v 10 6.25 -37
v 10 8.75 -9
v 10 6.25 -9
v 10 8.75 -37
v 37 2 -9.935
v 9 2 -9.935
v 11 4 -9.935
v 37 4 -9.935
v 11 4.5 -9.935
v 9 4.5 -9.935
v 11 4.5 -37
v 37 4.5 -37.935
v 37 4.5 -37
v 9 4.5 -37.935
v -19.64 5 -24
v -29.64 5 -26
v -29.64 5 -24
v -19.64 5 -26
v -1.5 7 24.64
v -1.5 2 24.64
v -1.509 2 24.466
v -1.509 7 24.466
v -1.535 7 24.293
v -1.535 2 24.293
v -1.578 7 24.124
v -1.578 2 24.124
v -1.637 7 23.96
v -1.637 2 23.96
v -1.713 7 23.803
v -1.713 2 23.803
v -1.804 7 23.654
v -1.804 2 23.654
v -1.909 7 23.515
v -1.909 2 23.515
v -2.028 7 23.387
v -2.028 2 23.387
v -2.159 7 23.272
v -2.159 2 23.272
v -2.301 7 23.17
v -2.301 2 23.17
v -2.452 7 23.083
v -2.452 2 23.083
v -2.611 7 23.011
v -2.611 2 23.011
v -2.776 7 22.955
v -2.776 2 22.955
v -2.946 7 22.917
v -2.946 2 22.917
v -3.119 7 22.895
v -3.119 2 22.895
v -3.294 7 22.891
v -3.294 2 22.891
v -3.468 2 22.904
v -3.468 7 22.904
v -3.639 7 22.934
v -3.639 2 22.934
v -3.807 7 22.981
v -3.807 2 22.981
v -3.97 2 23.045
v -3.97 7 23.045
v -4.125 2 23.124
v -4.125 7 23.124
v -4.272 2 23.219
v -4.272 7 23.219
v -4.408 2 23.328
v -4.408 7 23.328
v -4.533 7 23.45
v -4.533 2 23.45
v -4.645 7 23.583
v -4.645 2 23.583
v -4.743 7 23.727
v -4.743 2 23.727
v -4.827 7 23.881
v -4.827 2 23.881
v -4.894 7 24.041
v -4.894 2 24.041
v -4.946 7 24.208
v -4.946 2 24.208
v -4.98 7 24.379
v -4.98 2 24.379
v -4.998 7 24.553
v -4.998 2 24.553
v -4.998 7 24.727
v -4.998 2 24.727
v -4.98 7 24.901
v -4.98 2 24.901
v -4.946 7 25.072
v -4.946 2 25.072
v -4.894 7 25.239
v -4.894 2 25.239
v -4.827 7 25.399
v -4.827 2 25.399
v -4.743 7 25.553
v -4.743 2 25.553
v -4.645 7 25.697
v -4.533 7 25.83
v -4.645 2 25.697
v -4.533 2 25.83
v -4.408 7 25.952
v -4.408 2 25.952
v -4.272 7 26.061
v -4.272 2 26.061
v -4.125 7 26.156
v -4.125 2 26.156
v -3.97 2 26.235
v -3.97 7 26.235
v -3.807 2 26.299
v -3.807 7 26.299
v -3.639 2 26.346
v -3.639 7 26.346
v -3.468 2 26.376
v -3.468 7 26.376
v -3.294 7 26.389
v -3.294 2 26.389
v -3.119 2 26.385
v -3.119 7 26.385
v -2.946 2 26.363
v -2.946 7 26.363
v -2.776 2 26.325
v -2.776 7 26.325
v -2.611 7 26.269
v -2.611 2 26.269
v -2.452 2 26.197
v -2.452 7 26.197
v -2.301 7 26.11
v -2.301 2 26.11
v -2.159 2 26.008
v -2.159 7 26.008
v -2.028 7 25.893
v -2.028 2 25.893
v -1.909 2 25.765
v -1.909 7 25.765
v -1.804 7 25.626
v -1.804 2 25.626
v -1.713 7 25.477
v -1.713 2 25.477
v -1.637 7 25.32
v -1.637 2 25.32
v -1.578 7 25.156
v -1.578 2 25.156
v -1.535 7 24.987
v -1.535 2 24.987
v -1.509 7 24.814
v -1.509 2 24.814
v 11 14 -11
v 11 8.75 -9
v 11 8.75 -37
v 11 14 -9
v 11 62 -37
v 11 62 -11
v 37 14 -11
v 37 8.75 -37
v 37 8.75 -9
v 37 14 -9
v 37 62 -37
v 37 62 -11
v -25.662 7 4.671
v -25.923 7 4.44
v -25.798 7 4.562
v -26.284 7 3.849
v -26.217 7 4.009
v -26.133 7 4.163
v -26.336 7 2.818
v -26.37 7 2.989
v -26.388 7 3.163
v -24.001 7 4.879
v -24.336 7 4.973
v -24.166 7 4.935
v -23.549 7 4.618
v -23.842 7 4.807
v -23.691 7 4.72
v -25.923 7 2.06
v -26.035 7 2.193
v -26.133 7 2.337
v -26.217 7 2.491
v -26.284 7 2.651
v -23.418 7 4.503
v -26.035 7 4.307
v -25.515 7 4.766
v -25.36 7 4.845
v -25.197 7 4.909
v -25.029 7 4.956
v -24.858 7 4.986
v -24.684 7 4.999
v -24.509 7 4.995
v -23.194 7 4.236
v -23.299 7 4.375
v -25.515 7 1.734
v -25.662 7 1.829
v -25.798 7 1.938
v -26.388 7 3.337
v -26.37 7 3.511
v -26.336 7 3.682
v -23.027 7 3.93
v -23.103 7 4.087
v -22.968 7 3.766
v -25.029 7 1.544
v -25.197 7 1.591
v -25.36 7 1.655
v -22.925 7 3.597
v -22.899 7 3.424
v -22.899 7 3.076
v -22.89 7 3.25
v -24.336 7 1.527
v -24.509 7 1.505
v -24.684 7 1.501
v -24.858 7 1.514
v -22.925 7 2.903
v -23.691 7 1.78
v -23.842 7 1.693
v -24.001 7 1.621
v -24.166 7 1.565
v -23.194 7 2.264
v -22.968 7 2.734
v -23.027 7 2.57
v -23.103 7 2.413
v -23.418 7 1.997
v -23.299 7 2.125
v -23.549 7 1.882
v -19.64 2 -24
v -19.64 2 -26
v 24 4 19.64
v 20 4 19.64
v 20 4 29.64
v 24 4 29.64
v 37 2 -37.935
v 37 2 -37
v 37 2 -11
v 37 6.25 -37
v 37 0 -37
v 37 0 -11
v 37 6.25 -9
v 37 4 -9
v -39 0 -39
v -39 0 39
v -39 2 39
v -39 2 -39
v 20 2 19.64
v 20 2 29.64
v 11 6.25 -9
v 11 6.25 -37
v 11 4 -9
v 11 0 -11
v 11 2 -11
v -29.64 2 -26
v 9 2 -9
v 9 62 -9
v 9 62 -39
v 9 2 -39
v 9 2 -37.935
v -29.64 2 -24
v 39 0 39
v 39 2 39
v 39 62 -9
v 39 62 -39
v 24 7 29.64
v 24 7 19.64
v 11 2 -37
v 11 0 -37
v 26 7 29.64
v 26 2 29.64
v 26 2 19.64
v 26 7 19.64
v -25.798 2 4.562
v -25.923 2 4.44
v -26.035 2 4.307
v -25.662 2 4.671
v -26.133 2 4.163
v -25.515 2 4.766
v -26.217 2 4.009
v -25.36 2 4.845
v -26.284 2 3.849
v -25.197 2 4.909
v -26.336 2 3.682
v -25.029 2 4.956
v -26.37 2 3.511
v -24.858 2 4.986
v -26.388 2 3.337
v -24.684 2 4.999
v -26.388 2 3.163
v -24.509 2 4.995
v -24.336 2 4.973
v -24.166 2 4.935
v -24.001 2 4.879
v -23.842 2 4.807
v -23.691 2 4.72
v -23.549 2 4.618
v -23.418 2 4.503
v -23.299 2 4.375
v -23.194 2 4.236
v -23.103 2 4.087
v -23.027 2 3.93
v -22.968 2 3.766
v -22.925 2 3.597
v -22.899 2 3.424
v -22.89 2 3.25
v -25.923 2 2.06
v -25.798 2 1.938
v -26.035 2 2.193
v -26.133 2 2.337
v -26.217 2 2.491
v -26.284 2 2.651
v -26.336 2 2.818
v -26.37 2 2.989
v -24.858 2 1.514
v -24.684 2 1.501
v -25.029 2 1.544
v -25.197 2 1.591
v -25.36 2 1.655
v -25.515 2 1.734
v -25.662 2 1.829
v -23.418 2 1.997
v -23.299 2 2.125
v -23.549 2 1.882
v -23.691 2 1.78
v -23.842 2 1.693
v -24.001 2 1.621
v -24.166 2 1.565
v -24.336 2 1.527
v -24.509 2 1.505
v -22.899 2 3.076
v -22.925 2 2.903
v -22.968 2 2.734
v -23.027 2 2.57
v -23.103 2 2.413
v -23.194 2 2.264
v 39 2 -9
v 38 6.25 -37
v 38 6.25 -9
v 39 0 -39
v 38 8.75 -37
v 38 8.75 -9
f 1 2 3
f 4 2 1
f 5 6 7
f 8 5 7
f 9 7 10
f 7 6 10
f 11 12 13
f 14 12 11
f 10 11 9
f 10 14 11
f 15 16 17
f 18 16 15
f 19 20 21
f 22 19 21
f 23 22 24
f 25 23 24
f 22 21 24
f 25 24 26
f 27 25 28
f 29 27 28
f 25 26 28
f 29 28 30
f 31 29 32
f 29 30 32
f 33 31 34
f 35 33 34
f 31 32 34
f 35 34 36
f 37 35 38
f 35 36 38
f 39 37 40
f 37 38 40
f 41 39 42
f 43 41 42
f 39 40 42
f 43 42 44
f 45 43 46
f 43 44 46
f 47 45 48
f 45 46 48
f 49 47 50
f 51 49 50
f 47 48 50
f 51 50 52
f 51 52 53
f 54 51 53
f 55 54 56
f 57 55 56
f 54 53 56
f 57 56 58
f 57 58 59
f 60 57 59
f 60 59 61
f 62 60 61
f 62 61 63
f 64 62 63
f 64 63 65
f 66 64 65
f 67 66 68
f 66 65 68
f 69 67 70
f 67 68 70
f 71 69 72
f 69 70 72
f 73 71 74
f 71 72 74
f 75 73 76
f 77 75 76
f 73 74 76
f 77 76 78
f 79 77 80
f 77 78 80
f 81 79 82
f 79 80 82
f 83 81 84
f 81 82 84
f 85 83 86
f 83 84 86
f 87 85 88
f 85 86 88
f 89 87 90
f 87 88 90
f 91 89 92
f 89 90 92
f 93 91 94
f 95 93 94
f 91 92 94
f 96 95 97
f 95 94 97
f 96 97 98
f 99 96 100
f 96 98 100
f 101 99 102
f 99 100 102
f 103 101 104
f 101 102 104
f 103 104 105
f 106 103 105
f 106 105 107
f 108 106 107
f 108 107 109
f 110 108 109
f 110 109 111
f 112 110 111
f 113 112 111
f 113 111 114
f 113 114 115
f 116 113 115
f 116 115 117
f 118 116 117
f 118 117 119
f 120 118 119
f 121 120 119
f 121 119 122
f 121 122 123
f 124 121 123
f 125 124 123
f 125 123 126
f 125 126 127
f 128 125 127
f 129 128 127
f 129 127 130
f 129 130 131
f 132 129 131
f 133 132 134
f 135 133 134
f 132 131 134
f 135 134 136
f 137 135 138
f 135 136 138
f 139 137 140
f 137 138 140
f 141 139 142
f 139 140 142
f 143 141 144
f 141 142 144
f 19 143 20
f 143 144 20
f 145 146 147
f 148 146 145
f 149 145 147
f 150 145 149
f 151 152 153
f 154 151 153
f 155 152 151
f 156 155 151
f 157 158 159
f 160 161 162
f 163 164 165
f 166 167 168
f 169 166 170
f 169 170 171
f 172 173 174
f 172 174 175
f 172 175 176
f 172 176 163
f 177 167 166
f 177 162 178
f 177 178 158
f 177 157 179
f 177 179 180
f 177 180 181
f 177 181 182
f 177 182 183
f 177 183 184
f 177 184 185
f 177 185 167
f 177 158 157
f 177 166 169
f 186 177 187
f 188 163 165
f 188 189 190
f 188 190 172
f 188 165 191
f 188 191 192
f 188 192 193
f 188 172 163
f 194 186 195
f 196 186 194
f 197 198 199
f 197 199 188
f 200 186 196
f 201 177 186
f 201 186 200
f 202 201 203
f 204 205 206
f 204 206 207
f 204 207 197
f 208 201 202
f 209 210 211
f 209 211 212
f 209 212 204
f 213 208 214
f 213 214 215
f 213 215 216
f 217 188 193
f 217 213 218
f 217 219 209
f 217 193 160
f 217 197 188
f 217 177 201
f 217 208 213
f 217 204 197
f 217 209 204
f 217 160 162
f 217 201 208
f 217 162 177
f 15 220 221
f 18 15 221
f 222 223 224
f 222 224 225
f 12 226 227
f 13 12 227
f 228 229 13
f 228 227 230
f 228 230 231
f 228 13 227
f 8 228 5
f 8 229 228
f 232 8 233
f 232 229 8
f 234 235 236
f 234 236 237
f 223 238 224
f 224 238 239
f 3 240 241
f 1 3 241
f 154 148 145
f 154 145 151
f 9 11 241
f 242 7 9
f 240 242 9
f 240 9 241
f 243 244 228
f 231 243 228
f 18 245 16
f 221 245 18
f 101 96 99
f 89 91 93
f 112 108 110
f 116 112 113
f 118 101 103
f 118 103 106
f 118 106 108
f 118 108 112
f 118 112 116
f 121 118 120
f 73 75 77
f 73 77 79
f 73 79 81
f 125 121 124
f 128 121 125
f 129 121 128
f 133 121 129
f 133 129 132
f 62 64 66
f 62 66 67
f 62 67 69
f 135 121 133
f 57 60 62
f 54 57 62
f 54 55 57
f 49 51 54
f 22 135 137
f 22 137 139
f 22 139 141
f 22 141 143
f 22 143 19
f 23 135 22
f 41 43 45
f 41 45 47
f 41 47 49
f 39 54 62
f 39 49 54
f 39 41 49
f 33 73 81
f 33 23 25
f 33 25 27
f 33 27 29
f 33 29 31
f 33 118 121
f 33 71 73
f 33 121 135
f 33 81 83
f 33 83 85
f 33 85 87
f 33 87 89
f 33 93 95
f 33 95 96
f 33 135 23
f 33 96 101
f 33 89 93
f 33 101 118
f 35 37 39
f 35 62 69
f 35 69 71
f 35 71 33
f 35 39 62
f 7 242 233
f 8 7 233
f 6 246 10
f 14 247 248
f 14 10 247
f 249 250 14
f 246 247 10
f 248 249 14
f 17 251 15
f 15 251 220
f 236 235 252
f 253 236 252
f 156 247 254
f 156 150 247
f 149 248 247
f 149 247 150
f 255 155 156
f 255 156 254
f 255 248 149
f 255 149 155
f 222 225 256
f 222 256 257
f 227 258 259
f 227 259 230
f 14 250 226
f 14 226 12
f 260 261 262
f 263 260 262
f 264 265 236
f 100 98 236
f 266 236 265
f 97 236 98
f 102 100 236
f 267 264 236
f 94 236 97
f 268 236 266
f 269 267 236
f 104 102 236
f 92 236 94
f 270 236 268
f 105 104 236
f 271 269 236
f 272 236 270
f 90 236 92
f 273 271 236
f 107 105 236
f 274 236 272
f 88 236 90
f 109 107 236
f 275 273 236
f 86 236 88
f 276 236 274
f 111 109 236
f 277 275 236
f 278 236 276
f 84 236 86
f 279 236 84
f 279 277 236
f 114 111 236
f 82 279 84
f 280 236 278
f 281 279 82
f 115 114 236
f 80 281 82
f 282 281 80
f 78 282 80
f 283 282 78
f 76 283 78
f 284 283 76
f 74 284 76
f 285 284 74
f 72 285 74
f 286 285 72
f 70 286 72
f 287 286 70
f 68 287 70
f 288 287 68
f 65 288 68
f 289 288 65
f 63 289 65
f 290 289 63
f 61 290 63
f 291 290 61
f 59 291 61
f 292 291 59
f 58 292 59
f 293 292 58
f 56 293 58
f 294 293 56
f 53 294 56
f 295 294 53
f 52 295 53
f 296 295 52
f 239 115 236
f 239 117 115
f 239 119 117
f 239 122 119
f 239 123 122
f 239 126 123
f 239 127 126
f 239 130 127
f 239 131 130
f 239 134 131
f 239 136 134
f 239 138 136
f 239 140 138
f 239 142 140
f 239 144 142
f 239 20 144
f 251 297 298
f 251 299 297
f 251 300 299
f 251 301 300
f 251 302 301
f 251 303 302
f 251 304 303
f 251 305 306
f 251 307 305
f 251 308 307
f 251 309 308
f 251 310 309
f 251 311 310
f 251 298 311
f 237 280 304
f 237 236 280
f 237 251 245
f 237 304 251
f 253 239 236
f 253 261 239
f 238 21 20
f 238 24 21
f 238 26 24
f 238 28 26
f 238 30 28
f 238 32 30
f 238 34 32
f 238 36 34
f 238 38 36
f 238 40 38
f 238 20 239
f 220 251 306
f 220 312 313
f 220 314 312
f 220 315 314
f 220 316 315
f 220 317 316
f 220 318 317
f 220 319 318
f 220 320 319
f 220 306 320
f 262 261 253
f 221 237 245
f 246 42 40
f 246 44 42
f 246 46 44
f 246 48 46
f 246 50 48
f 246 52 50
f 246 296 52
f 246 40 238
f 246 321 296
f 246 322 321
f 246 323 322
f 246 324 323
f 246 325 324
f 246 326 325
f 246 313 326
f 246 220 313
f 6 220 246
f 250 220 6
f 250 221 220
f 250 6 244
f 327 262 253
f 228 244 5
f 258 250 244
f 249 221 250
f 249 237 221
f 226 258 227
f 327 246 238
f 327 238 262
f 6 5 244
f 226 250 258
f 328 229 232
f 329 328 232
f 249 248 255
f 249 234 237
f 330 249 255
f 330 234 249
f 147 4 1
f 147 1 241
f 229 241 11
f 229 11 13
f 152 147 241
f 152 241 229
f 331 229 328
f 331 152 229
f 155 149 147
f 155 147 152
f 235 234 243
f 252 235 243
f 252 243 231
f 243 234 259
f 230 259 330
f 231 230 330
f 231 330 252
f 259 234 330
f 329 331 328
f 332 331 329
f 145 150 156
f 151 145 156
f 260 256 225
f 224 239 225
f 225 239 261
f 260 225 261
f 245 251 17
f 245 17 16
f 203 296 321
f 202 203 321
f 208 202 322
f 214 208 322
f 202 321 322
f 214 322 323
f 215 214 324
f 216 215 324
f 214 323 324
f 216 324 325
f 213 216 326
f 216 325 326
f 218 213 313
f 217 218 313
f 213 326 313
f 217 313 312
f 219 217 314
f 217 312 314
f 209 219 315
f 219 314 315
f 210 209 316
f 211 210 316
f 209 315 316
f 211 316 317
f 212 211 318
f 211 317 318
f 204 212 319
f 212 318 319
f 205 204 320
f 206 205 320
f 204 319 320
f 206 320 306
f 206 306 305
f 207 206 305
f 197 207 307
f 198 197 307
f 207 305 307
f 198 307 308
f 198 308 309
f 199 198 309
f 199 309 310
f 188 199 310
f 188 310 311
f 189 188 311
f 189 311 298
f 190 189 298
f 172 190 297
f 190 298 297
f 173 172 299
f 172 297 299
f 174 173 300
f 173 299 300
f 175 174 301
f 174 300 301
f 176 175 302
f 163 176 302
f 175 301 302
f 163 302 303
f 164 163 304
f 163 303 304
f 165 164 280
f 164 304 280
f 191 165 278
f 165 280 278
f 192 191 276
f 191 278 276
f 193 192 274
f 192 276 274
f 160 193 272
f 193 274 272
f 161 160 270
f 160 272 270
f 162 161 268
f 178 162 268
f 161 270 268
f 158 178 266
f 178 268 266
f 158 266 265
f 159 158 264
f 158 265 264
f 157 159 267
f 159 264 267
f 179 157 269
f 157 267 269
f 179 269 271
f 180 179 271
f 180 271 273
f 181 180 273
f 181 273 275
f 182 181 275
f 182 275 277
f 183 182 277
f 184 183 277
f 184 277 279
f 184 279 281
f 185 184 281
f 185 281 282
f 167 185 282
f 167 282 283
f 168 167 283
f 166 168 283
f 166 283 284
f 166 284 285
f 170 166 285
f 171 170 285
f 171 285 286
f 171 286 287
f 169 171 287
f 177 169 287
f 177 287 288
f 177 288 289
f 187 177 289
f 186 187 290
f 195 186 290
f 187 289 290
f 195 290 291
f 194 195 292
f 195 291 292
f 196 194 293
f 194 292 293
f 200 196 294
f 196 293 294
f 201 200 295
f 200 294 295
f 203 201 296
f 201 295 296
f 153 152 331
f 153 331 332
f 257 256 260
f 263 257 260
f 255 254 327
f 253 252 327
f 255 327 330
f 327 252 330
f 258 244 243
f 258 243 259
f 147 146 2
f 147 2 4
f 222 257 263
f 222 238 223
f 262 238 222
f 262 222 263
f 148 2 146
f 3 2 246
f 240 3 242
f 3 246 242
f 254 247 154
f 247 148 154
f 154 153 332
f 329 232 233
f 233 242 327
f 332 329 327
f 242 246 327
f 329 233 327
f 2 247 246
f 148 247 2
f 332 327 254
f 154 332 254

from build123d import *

# Parameters (mm, degrees)
SKETCH1_W            = 78
SKETCH1_H            = 78
BOSS_EXTRUDE1_DEPTH  = 2
SKETCH2_W            = 30
SKETCH2_H            = 30
BOSS_EXTRUDE2_DEPTH  = 60
SKETCH3_W            = 26
SKETCH3_H            = 26
CUT_EXTRUDE1_DEPTH   = 62
SKETCH4_W            = 28
SKETCH4_H            = 2.5
CUT_EXTRUDE2_DEPTH   = 28
SKETCH5_W            = 26
SKETCH5_H            = 10
CUT_EXTRUDE3_DEPTH   = 2
SKETCH6_W            = 28
SKETCH6_H            = 2.5
CUT_EXTRUDE4_DEPTH   = 1
SKETCH7_W            = 28
SKETCH7_H            = 2.5
CUT_EXTRUDE5_DEPTH   = 1
SKETCH14_R           = 1.75
BOSS_EXTRUDE8_DEPTH  = 5
SKETCH15_R           = 1.75
BOSS_EXTRUDE9_DEPTH  = 5
SKETCH16_W           = 4
SKETCH16_H           = 5
BOSS_EXTRUDE10_DEPTH = 2
SKETCH17_W           = 2
SKETCH17_H           = 10
BOSS_EXTRUDE11_DEPTH = 5
SKETCH18_W           = 10
SKETCH18_H           = 2
BOSS_EXTRUDE12_DEPTH = 3


with BuildPart() as part:
    # Sketch1 → Boss-Extrude1 (new body)
    with BuildSketch(Plane(origin=(0, 0, 0), x_dir=(1, 0, 0), z_dir=(0, 1, 0))):
        Rectangle(SKETCH1_W, SKETCH1_H)
    extrude(amount=BOSS_EXTRUDE1_DEPTH)

    # Sketch2 → Boss-Extrude2 (add)
    with BuildSketch(Plane(origin=(0, 2, 0), x_dir=(1, 0, 0), z_dir=(0, 1, 0))):
        with Locations((24, 24)):
            Rectangle(SKETCH2_W, SKETCH2_H)
    extrude(amount=BOSS_EXTRUDE2_DEPTH)

    # Sketch3 → Cut-Extrude1 (cut)
    with BuildSketch(Plane(origin=(0, 62, 0), x_dir=(1, 0, 0), z_dir=(0, 1, 0))):
        with Locations((24, 24)):
            Rectangle(SKETCH3_W, SKETCH3_H)
    extrude(amount=-CUT_EXTRUDE1_DEPTH, mode=Mode.SUBTRACT)

    # Sketch4 → Cut-Extrude2 (cut)
    with BuildSketch(Plane.ZY.offset(-9)):
        with Locations((-23.934548619, 3.25)):
            Rectangle(SKETCH4_W, SKETCH4_H)
    extrude(amount=-CUT_EXTRUDE2_DEPTH, mode=Mode.SUBTRACT)

    # Sketch5 → Cut-Extrude3 (cut)
    with BuildSketch(Plane.XY.offset(-9)):
        with Locations((24, 9)):
            Rectangle(SKETCH5_W, SKETCH5_H)
    extrude(amount=-CUT_EXTRUDE3_DEPTH, mode=Mode.SUBTRACT)

    # Sketch6 → Cut-Extrude4 (cut)
    with BuildSketch(Plane.ZY.offset(-37)):
        with Locations((-23, 7.5)):
            Rectangle(SKETCH6_W, SKETCH6_H)
    extrude(amount=-CUT_EXTRUDE4_DEPTH, mode=Mode.SUBTRACT)

    # Sketch7 → Cut-Extrude5 (cut)
    with BuildSketch(Plane(origin=(11, 0, 0), x_dir=(0, 0, -1), z_dir=(1, 0, 0))):
        with Locations((23, 7.5)):
            Rectangle(SKETCH7_W, SKETCH7_H)
    extrude(amount=-CUT_EXTRUDE5_DEPTH, mode=Mode.SUBTRACT)

    # Sketch14 → Boss-Extrude8 (add)
    with BuildSketch(Plane(origin=(0, 2, 0), x_dir=(1, 0, 0), z_dir=(0, 1, 0))):
        with Locations((-3.25, -24.64)):
            Circle(SKETCH14_R)
    extrude(amount=BOSS_EXTRUDE8_DEPTH)

    # Sketch15 → Boss-Extrude9 (add)
    with BuildSketch(Plane(origin=(0, 2, 0), x_dir=(1, 0, 0), z_dir=(0, 1, 0))):
        with Locations((-24.64, -3.25)):
            Circle(SKETCH15_R)
    extrude(amount=BOSS_EXTRUDE9_DEPTH)

    # Sketch16 → Boss-Extrude10 (add)
    with BuildSketch(Plane(origin=(0, 2, 0), x_dir=(1, 0, 0), z_dir=(0, 1, 0))):
        with Locations((22, -22.14)):
            Rectangle(SKETCH16_W, SKETCH16_H)
        with Locations((22, -27.14)):
            Rectangle(SKETCH16_W, SKETCH16_H)
    extrude(amount=BOSS_EXTRUDE10_DEPTH)

    # Sketch17 → Boss-Extrude11 (add)
    with BuildSketch(Plane(origin=(0, 2, 0), x_dir=(1, 0, 0), z_dir=(0, 1, 0))):
        with Locations((25, -24.64)):
            Rectangle(SKETCH17_W, SKETCH17_H)
    extrude(amount=BOSS_EXTRUDE11_DEPTH)

    # Sketch18 → Boss-Extrude12 (add)
    with BuildSketch(Plane(origin=(0, 2, 0), x_dir=(1, 0, 0), z_dir=(0, 1, 0))):
        with Locations((-24.64, 25)):
            Rectangle(SKETCH18_W, SKETCH18_H)
    extrude(amount=BOSS_EXTRUDE12_DEPTH)


solid = part.part
